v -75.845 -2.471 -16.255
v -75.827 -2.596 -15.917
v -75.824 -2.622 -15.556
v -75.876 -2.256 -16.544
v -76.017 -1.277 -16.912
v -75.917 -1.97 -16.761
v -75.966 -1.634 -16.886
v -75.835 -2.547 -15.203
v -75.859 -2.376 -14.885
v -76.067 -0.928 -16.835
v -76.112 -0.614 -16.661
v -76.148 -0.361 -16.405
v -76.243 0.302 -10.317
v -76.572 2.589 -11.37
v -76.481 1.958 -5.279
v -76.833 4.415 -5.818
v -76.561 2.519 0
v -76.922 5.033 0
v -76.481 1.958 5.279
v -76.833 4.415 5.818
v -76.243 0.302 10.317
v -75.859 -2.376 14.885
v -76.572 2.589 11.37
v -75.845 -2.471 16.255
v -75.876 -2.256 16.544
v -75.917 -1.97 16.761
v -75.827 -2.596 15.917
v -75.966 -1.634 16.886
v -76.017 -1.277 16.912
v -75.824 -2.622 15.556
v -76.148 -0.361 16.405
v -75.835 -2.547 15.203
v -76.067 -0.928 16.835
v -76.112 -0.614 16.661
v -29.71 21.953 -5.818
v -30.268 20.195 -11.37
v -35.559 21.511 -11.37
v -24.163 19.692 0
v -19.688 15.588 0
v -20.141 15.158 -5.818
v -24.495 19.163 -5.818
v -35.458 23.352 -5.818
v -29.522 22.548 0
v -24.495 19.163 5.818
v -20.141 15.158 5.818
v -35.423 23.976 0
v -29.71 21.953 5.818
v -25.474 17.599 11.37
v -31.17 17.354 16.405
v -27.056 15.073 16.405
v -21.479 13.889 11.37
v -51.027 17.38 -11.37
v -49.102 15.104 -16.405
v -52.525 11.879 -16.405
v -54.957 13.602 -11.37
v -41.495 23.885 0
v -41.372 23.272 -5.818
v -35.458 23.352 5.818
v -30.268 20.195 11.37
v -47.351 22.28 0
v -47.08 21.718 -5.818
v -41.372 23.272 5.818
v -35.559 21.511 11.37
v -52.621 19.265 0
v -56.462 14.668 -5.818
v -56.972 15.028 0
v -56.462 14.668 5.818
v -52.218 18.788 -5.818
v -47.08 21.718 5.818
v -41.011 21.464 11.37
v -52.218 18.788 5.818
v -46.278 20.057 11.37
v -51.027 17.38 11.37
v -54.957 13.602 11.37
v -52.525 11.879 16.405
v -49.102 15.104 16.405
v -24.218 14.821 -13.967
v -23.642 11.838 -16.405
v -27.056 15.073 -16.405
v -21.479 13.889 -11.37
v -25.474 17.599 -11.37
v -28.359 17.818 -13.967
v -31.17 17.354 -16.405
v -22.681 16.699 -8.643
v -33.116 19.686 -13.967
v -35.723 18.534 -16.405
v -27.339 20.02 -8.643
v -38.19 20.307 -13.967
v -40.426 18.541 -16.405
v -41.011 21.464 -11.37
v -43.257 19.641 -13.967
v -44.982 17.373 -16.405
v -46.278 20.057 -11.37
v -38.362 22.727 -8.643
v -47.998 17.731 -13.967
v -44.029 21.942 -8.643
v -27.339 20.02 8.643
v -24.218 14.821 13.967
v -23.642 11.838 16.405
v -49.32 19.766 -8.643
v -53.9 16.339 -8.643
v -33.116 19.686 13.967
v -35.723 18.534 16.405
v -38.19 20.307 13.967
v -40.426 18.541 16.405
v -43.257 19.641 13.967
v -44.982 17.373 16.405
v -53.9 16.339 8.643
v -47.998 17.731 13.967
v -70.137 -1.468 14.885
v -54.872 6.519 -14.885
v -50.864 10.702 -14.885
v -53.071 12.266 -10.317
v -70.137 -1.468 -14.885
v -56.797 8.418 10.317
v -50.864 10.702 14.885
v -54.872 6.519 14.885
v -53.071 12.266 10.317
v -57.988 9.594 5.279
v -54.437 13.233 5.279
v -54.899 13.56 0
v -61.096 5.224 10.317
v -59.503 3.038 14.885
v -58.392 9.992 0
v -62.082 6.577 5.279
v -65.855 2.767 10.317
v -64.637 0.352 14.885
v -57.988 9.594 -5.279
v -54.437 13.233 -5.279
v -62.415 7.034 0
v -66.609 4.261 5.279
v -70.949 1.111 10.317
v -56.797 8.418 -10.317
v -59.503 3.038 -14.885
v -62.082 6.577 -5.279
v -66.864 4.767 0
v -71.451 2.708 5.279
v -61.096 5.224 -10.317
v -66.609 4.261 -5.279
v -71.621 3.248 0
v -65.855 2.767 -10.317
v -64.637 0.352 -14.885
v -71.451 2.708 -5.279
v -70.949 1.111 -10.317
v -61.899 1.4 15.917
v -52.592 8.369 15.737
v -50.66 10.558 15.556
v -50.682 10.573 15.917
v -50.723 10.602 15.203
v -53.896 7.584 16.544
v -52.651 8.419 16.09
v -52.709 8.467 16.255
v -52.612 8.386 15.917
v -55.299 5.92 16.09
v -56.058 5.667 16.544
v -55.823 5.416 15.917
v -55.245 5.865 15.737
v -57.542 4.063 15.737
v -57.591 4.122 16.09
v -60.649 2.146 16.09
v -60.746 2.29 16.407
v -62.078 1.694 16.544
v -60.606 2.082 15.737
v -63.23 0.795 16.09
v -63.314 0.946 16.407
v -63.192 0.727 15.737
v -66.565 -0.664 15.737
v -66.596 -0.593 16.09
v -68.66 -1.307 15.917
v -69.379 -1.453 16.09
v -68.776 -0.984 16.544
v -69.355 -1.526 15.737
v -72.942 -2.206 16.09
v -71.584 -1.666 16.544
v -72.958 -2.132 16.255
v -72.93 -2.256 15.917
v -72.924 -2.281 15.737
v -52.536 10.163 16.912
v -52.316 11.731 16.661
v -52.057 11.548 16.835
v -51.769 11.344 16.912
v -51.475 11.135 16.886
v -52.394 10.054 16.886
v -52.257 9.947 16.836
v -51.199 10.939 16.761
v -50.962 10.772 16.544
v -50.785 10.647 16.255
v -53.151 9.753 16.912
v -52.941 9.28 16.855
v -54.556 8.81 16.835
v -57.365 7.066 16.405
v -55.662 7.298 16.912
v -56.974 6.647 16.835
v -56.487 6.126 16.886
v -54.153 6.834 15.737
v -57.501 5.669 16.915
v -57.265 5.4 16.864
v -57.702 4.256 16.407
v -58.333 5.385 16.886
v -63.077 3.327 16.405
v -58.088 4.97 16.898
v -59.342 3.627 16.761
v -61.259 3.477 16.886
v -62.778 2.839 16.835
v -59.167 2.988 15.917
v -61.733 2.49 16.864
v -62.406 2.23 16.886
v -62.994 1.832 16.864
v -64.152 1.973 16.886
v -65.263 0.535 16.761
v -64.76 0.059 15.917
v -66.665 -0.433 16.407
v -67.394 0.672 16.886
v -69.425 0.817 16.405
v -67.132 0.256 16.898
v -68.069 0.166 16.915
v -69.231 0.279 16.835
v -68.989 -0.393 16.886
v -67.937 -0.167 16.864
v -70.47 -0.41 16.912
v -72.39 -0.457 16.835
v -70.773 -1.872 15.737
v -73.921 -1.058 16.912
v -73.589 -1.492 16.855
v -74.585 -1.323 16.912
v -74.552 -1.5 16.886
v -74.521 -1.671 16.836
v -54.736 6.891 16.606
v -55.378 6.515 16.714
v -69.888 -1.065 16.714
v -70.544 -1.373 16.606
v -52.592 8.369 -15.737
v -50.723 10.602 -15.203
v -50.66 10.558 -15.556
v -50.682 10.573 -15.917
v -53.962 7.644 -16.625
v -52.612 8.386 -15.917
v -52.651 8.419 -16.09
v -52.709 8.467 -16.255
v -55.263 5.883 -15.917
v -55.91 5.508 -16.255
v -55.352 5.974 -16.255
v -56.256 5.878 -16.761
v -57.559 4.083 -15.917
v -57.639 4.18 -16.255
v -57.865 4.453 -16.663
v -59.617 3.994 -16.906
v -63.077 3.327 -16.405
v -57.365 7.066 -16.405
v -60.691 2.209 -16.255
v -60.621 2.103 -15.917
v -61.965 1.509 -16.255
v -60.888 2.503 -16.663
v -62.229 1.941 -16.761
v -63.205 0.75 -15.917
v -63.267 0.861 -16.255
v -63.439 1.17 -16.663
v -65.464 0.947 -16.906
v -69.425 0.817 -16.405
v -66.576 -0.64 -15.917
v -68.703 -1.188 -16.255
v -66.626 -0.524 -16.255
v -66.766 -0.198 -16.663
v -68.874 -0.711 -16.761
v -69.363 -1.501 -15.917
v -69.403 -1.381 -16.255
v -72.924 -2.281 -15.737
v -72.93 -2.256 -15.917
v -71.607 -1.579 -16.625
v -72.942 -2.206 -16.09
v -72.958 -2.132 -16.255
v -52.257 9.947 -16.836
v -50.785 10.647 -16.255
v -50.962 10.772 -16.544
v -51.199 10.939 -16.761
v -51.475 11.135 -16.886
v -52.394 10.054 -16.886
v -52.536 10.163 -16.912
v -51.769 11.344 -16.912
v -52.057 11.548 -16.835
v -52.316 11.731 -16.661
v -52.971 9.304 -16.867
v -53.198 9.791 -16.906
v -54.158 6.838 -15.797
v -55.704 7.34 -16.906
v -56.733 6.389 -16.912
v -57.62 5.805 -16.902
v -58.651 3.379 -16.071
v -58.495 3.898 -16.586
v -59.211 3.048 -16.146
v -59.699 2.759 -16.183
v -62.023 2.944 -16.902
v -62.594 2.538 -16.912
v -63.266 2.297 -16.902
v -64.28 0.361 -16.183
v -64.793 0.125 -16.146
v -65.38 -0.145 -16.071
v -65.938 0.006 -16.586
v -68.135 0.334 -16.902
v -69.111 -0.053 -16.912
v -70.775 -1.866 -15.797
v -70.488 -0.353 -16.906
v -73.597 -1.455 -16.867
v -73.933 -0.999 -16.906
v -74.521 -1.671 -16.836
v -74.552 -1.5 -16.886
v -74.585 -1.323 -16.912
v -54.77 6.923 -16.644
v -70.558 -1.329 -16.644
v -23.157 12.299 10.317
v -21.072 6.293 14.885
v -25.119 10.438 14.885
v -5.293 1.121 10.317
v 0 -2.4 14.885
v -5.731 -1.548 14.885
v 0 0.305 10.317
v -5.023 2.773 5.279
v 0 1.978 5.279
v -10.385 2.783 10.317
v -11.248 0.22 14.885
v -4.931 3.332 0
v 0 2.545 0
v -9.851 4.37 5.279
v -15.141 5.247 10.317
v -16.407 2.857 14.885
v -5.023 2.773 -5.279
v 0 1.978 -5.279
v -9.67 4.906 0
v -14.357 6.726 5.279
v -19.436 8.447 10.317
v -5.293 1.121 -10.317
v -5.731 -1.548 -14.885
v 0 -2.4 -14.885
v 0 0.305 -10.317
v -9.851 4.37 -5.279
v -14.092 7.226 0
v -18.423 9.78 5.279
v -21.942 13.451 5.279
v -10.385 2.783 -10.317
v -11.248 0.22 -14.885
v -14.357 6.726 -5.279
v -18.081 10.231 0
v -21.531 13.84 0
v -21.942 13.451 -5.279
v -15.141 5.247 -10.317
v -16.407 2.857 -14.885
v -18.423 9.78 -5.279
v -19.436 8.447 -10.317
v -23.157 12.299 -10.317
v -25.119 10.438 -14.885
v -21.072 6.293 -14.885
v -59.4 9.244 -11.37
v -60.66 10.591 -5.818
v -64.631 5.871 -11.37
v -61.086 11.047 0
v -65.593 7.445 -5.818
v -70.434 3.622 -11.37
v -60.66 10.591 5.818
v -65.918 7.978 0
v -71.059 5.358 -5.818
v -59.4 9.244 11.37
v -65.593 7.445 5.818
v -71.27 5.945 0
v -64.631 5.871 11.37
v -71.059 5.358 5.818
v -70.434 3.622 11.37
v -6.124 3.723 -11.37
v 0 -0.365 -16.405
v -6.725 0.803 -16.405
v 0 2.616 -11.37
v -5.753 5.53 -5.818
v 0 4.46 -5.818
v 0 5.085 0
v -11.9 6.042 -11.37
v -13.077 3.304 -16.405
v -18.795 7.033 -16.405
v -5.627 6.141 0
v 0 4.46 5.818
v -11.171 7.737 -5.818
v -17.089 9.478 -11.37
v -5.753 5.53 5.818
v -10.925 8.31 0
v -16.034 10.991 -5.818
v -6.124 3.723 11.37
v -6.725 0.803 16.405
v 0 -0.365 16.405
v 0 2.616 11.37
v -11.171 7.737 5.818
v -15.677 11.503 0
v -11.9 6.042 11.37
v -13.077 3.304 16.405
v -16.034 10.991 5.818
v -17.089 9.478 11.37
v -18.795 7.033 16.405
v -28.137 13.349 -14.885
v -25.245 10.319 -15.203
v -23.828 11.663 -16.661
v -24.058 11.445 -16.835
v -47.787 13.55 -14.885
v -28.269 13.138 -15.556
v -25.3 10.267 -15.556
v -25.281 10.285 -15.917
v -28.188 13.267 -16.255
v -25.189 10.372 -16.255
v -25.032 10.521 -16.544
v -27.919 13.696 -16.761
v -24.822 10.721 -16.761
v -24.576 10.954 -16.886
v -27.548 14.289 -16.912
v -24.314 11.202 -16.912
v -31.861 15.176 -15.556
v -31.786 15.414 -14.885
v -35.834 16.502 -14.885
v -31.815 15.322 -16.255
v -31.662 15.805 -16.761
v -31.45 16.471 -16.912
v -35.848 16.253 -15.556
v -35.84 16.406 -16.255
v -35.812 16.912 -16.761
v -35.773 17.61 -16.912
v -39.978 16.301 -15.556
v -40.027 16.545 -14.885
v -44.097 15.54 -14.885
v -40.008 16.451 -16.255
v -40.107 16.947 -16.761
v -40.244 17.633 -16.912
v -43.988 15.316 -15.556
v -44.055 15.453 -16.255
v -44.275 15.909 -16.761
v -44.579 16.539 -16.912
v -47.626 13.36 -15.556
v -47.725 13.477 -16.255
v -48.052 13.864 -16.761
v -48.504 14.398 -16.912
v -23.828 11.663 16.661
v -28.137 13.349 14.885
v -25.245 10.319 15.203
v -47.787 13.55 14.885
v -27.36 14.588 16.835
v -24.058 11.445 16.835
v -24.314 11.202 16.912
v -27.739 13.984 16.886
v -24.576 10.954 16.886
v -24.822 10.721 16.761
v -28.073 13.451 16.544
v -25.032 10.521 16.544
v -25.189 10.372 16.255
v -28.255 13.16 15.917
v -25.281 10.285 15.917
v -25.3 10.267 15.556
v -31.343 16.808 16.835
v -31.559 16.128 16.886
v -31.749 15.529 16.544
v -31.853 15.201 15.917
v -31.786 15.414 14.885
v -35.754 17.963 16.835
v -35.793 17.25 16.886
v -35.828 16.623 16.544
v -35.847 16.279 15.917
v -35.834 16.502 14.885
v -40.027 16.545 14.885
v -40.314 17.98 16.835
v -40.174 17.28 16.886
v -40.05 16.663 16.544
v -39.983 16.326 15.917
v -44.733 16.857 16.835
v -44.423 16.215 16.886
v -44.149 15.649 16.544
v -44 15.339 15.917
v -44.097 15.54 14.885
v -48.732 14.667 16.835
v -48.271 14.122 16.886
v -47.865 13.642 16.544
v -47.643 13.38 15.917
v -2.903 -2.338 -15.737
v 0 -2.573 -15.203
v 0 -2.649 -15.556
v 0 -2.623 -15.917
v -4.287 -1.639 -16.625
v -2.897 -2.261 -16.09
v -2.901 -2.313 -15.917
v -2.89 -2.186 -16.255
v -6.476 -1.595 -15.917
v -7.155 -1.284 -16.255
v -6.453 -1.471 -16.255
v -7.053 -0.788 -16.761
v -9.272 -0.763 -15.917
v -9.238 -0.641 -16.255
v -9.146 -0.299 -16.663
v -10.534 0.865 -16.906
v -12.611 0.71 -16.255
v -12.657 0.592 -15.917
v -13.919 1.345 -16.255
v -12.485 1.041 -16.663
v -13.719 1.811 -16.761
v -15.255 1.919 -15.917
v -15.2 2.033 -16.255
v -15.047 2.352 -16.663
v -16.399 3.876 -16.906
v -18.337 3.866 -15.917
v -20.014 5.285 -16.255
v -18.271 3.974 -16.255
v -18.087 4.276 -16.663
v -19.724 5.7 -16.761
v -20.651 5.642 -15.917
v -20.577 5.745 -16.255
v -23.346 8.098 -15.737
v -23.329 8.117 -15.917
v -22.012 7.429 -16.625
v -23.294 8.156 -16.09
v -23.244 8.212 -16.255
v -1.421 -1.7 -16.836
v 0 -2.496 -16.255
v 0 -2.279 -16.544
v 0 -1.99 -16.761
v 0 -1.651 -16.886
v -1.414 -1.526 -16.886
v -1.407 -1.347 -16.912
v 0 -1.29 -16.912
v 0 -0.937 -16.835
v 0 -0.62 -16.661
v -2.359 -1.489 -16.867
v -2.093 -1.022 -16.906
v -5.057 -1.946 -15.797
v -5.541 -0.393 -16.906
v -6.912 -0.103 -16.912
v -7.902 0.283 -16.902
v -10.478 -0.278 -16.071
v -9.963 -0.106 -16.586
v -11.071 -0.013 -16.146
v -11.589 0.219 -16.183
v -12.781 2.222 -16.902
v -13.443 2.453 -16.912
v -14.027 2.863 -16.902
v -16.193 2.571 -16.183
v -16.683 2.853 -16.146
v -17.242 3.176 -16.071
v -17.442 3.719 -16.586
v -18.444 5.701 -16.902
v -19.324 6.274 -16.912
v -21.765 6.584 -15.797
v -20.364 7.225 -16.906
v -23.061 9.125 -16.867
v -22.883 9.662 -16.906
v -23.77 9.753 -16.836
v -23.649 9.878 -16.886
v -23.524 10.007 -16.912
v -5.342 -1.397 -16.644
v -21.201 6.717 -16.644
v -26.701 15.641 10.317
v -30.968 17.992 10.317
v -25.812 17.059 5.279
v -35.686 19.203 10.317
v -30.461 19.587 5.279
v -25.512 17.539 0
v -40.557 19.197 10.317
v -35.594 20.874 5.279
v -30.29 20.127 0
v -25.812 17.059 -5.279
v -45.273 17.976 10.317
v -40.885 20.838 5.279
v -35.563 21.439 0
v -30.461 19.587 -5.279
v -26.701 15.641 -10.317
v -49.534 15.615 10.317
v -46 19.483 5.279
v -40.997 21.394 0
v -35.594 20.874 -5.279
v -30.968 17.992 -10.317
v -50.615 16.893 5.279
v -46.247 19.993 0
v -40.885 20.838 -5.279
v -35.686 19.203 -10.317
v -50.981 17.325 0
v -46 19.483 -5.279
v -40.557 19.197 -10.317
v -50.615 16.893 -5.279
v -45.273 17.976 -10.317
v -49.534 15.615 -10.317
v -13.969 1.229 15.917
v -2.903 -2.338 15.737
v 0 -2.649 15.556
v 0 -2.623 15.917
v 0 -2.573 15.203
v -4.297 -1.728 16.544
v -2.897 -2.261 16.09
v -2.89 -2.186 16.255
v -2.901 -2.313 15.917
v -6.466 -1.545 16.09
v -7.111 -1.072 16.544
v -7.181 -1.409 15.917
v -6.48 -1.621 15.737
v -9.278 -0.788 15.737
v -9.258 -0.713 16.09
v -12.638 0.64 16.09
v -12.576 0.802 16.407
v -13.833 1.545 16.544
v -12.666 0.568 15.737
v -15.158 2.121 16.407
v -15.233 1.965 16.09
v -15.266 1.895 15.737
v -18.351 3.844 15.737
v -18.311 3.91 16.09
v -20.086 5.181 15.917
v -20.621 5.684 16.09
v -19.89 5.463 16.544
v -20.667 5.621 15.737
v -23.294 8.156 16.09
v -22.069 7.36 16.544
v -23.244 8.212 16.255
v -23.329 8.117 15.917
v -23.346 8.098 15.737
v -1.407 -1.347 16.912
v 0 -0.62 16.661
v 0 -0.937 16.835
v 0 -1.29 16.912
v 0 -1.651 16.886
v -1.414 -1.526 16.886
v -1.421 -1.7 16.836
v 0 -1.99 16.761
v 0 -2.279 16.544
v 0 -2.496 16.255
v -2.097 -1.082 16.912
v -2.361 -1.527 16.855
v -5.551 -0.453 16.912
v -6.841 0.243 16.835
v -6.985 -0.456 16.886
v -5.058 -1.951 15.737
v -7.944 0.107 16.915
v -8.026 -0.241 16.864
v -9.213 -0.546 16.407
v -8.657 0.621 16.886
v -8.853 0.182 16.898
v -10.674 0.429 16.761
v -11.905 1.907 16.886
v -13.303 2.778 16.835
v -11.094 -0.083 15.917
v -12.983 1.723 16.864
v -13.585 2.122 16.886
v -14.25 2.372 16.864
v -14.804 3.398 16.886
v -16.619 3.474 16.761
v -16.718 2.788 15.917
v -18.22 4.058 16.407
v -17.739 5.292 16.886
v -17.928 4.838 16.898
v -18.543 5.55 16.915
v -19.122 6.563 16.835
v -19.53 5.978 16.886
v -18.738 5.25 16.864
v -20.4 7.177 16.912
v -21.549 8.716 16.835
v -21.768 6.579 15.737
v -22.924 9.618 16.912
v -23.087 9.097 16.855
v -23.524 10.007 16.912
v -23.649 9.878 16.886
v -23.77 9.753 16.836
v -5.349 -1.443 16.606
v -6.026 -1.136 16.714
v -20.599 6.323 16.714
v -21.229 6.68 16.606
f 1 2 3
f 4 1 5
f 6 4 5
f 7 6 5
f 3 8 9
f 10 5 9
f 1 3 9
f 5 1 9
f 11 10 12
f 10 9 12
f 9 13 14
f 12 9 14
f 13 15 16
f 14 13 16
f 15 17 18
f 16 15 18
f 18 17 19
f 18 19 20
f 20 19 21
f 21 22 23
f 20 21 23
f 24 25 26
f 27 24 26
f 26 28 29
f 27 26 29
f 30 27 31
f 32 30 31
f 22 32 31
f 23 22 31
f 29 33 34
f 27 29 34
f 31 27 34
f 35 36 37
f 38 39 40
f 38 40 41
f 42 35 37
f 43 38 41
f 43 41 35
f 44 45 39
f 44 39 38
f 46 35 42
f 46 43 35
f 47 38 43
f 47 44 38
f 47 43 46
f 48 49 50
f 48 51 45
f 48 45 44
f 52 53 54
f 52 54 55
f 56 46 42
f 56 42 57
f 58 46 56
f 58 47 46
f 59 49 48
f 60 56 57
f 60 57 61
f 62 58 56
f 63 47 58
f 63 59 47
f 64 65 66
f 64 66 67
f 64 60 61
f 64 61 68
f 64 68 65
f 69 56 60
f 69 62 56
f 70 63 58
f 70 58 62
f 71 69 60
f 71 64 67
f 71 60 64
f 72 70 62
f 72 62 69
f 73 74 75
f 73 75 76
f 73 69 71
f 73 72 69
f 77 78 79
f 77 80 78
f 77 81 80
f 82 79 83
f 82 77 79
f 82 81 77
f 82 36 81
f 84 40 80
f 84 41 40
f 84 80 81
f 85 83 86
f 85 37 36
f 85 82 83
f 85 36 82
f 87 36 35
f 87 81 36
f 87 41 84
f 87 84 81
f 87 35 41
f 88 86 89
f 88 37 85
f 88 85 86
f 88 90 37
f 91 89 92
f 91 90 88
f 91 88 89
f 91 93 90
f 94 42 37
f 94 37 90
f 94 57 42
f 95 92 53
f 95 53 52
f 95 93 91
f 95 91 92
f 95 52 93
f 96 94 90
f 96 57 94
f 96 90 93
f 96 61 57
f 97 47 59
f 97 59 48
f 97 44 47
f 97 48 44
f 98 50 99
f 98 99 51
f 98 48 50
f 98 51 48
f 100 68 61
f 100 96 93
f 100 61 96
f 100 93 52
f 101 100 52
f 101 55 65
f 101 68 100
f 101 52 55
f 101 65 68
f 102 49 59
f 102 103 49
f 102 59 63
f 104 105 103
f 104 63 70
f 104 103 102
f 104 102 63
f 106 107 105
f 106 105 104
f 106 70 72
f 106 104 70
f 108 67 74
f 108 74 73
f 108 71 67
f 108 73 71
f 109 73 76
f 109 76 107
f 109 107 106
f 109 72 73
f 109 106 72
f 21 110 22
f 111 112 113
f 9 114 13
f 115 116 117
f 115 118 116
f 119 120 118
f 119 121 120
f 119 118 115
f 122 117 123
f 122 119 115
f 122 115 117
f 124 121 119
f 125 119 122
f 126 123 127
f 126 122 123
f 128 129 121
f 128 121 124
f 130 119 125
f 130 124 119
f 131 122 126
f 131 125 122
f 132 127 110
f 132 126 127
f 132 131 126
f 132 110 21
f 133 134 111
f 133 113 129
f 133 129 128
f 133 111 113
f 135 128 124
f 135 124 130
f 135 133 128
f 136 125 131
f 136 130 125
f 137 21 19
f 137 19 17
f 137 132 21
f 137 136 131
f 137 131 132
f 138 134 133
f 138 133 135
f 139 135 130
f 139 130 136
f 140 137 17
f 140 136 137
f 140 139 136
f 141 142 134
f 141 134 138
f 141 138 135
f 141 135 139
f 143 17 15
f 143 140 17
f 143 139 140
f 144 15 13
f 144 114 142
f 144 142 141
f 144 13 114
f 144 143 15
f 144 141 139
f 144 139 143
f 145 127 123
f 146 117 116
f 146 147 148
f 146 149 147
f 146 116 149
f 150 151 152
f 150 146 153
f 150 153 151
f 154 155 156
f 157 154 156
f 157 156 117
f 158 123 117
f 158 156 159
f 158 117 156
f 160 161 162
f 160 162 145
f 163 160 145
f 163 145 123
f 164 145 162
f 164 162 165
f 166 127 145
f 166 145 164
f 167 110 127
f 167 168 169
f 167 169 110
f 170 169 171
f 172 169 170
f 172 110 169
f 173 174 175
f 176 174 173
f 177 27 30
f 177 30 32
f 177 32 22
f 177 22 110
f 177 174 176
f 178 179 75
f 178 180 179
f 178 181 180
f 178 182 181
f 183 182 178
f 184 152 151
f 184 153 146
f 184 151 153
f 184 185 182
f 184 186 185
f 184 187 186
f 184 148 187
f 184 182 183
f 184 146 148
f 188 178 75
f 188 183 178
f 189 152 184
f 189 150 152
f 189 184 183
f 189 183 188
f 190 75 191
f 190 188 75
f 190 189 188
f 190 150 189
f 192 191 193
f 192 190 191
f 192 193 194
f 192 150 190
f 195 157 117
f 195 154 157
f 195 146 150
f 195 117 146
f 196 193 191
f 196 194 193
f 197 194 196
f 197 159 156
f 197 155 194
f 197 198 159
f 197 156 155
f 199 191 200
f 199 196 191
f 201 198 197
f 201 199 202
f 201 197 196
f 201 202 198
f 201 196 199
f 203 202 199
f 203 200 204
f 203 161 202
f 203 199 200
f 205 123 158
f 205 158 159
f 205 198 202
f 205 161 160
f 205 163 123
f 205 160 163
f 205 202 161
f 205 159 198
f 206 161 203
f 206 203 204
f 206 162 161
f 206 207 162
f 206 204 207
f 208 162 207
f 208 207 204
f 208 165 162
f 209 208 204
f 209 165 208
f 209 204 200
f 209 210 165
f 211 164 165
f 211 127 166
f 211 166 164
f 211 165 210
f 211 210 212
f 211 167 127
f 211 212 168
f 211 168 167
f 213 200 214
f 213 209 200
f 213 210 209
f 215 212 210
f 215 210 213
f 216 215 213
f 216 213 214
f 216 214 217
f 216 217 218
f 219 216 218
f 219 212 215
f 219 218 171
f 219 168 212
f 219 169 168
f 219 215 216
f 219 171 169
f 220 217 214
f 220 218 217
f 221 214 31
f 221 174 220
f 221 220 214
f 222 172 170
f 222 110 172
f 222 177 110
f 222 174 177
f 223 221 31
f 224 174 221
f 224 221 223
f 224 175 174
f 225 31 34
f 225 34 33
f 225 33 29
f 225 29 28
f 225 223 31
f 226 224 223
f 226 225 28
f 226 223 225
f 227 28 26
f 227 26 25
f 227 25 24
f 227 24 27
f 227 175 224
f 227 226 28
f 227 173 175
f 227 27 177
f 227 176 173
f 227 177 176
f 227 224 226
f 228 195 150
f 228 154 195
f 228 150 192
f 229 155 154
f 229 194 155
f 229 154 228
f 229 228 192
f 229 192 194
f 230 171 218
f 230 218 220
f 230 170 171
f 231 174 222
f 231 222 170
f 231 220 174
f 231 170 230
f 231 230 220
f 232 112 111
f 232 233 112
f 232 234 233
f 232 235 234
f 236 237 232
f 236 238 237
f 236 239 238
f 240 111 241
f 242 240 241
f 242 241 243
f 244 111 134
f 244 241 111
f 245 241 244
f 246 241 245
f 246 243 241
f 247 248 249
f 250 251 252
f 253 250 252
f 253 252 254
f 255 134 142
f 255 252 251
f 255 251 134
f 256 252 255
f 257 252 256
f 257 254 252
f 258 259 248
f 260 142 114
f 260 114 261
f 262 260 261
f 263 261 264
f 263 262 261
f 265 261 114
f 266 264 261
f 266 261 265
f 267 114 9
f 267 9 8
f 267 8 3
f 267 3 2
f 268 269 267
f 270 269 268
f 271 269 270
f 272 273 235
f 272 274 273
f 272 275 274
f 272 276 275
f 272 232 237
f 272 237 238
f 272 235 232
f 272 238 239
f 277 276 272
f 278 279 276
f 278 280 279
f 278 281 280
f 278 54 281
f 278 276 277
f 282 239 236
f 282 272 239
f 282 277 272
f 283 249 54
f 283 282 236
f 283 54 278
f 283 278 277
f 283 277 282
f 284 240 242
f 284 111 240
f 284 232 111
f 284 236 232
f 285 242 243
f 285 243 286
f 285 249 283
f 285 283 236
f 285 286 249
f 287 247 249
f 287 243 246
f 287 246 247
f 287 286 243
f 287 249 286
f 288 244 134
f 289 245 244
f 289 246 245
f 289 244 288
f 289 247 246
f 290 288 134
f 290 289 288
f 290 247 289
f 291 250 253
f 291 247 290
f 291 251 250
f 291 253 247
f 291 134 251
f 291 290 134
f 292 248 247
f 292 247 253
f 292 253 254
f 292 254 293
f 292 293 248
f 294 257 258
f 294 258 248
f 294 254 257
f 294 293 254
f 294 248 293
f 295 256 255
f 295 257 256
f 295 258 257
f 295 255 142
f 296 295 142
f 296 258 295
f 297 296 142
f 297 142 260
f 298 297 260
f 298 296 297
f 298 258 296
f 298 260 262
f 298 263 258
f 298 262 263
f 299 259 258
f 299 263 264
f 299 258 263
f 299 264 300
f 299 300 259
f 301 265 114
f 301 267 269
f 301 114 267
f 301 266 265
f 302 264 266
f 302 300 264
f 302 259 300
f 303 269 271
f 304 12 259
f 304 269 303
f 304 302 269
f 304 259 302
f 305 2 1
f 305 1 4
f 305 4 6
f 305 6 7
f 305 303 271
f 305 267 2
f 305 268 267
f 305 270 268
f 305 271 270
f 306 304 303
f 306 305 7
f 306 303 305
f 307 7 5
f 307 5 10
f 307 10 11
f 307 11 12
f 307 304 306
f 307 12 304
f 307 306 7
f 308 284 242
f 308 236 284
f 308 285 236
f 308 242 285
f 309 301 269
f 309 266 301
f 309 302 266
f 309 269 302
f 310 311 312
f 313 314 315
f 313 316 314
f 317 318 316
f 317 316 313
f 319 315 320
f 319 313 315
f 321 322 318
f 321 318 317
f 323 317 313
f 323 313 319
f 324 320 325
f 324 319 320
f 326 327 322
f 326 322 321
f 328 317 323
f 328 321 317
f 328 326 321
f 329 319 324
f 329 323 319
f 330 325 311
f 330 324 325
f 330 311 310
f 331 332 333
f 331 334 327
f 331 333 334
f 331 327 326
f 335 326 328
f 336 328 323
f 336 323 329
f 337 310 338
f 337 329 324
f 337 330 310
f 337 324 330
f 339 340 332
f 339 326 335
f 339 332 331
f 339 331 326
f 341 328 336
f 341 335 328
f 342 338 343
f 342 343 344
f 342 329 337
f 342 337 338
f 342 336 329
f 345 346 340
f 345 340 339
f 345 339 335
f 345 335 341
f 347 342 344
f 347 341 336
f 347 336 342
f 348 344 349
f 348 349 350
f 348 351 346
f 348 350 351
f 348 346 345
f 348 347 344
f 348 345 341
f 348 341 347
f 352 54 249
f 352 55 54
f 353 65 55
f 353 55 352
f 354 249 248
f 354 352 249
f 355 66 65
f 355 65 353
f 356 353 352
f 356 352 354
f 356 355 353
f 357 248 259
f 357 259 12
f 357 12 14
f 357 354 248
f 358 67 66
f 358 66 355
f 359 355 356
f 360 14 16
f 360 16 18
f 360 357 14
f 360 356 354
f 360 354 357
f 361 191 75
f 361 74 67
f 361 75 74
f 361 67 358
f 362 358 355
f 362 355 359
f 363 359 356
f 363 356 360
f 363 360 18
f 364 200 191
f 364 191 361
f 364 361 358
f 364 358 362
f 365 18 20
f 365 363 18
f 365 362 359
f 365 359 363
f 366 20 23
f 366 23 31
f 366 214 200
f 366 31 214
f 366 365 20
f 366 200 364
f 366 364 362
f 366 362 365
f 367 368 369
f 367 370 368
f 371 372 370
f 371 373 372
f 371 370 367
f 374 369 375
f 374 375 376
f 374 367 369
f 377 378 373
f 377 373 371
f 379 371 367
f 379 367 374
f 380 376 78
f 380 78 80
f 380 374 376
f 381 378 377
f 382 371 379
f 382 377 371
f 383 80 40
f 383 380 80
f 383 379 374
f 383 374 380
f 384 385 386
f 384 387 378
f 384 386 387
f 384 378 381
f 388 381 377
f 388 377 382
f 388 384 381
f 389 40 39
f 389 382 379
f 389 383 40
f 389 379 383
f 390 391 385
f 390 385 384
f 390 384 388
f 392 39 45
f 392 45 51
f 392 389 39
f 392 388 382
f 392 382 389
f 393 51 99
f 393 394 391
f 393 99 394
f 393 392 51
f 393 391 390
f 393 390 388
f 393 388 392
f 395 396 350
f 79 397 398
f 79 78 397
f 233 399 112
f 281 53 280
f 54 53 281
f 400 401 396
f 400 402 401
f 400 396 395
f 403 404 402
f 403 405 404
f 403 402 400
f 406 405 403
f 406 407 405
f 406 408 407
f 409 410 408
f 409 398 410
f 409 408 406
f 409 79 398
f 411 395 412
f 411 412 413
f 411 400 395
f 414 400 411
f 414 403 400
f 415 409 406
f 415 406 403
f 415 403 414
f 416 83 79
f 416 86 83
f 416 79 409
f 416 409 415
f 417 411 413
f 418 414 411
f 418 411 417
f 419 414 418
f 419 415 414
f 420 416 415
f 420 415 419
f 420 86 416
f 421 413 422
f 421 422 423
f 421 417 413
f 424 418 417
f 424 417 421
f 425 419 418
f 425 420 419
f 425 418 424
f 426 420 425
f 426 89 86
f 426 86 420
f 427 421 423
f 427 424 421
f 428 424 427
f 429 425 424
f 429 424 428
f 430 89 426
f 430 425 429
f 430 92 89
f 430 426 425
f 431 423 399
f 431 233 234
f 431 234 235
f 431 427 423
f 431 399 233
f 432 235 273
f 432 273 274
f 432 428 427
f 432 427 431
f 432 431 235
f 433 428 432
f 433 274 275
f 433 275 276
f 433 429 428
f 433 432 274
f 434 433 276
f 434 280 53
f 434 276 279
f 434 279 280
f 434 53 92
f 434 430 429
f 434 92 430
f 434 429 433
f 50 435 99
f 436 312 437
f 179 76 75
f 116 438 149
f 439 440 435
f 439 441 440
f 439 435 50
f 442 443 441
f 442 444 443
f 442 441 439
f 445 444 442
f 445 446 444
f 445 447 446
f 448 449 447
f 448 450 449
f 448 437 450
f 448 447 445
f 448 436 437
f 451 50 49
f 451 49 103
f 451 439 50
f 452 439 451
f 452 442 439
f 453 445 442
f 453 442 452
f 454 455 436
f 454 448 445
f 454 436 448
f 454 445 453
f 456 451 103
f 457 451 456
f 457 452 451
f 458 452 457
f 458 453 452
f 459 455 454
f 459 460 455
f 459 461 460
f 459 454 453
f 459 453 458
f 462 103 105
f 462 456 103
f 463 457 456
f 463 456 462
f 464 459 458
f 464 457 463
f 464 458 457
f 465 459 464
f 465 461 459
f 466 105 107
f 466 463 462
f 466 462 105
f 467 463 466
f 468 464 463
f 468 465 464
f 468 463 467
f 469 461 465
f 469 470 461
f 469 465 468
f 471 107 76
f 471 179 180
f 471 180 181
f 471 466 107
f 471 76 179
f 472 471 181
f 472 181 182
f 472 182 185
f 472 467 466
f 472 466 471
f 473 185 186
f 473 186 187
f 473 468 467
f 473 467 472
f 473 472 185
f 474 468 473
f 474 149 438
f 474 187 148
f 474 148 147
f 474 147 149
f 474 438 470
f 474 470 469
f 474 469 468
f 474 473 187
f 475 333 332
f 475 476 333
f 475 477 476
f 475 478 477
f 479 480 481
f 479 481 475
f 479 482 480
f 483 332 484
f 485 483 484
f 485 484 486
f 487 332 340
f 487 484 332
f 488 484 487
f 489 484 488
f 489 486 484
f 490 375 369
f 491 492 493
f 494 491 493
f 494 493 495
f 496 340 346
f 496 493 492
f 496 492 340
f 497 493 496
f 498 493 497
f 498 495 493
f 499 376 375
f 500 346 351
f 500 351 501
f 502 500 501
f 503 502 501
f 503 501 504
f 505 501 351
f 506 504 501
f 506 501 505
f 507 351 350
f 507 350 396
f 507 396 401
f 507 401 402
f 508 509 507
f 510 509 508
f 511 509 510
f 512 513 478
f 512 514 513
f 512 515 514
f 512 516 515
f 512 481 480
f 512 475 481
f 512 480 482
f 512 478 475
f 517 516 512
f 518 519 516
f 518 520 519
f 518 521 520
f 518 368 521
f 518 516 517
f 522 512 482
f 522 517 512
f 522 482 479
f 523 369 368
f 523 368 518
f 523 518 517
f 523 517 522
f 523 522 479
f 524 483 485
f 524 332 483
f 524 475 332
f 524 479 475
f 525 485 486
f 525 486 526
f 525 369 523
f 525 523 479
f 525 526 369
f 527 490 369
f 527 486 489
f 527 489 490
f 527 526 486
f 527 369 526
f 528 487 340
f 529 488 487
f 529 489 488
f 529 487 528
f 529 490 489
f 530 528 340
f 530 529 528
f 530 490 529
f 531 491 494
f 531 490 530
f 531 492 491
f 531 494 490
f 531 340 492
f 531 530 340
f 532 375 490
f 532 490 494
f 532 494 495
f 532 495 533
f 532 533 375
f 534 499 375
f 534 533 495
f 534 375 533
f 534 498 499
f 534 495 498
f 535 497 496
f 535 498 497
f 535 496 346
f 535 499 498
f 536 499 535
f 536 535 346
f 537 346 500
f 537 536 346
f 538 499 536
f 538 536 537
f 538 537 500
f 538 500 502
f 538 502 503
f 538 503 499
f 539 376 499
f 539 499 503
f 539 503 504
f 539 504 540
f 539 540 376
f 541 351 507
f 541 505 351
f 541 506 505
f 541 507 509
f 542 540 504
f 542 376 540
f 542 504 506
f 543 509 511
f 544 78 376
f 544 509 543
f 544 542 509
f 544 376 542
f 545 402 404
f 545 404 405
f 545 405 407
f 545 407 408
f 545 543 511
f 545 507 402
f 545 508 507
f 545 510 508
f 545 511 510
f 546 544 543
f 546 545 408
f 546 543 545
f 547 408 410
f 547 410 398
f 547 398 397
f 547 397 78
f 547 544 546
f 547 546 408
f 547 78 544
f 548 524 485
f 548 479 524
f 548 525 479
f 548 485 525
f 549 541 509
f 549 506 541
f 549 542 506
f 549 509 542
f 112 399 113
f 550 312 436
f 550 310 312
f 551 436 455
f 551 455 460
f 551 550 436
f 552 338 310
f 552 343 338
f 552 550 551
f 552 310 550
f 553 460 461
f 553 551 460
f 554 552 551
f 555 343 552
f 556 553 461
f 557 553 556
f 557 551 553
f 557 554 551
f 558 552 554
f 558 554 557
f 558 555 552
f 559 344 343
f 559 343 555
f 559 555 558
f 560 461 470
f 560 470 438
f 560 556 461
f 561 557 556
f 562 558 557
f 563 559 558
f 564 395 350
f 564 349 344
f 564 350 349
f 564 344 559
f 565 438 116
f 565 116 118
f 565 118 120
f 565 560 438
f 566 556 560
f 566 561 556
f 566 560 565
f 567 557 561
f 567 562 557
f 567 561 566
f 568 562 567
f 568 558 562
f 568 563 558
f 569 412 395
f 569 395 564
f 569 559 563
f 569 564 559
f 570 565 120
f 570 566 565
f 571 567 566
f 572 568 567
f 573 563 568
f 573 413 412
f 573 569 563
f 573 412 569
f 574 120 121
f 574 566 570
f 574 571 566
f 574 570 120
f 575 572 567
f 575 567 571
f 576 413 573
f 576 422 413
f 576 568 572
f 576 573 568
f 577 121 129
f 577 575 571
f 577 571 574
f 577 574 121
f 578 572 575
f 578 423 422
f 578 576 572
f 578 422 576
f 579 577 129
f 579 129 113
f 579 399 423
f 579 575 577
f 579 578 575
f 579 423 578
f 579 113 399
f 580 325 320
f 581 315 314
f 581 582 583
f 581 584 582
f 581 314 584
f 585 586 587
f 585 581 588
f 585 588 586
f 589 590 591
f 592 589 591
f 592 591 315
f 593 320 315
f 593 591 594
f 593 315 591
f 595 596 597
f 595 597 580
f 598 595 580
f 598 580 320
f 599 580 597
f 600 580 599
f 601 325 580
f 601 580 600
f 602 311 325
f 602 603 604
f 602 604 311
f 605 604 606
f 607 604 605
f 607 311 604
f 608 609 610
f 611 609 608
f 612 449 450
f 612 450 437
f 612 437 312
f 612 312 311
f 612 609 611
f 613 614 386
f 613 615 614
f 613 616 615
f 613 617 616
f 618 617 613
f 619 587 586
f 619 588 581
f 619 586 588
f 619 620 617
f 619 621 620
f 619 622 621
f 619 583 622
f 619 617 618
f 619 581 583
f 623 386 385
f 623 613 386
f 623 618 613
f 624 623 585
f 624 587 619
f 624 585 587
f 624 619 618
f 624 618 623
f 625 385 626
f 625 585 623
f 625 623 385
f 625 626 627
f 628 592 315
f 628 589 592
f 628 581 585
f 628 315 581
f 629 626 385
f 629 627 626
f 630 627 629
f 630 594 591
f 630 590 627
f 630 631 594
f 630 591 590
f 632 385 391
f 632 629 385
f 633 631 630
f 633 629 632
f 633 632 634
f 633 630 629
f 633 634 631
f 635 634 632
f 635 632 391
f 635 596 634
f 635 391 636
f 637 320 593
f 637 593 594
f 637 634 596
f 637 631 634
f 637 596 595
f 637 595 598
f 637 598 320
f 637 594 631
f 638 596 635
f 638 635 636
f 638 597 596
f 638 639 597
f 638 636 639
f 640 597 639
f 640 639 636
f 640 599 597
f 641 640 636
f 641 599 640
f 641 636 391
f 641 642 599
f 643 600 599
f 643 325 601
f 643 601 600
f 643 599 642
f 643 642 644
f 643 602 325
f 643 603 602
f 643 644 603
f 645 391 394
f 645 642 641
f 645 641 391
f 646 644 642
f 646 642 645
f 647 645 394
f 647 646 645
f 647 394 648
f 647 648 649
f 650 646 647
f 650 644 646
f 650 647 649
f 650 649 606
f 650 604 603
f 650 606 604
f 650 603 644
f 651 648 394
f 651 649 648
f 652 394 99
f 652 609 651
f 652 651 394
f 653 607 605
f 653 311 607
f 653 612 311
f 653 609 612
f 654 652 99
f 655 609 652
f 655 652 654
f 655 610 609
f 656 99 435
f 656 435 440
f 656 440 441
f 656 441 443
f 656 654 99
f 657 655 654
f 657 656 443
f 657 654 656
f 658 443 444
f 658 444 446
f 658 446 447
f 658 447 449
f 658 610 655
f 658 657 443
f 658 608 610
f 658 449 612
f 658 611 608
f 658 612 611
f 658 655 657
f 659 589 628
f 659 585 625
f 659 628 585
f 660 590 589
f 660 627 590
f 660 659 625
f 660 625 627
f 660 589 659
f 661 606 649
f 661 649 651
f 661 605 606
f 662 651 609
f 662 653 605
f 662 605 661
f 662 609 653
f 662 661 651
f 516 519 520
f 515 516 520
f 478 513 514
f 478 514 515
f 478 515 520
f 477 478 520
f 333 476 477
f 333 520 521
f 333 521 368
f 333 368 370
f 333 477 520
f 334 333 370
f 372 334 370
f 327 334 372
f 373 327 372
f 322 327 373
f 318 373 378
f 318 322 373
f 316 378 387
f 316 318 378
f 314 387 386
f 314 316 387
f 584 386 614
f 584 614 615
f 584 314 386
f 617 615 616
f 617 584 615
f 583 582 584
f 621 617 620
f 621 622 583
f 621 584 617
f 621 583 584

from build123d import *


with BuildPart() as part:
    # Sweep1: sweep along a path in Sketch4
    with BuildLine(Plane.XY) as sweep1_path:
        ThreePointArc((0, 0), (-12.933123295, 3.638699735), (-23.377708341, 12.089525561))
        ThreePointArc((-23.377708341, 12.089525561), (-38.1, 19.05), (-52.822291659, 12.089525561))
        ThreePointArc((-52.822291659, 12.089525561), (-63.266876705, 3.638699735), (-76.2, 0))
    # Sketch2 → Sweep1 (sweep)
    with BuildSketch(Plane(origin=(0, 0, 0), x_dir=(0, 0, -1), z_dir=(1, 0, 0))):
        with BuildLine():
            ThreePointArc((14.885260382, -2.399980647), (0, 2.544792821), (-14.885260382, -2.399980647))
            ThreePointArc((-14.885260382, -2.399980647), (-16.662734914, -2.14232916), (-16.405083427, -0.364854628))
            ThreePointArc((-16.405083427, -0.364854628), (0, 5.084792821), (16.405083427, -0.364854628))
            ThreePointArc((16.405083427, -0.364854628), (16.662734914, -2.14232916), (14.885260382, -2.399980647))
        make_face()
    sweep(path=sweep1_path.line)


solid = part.part
